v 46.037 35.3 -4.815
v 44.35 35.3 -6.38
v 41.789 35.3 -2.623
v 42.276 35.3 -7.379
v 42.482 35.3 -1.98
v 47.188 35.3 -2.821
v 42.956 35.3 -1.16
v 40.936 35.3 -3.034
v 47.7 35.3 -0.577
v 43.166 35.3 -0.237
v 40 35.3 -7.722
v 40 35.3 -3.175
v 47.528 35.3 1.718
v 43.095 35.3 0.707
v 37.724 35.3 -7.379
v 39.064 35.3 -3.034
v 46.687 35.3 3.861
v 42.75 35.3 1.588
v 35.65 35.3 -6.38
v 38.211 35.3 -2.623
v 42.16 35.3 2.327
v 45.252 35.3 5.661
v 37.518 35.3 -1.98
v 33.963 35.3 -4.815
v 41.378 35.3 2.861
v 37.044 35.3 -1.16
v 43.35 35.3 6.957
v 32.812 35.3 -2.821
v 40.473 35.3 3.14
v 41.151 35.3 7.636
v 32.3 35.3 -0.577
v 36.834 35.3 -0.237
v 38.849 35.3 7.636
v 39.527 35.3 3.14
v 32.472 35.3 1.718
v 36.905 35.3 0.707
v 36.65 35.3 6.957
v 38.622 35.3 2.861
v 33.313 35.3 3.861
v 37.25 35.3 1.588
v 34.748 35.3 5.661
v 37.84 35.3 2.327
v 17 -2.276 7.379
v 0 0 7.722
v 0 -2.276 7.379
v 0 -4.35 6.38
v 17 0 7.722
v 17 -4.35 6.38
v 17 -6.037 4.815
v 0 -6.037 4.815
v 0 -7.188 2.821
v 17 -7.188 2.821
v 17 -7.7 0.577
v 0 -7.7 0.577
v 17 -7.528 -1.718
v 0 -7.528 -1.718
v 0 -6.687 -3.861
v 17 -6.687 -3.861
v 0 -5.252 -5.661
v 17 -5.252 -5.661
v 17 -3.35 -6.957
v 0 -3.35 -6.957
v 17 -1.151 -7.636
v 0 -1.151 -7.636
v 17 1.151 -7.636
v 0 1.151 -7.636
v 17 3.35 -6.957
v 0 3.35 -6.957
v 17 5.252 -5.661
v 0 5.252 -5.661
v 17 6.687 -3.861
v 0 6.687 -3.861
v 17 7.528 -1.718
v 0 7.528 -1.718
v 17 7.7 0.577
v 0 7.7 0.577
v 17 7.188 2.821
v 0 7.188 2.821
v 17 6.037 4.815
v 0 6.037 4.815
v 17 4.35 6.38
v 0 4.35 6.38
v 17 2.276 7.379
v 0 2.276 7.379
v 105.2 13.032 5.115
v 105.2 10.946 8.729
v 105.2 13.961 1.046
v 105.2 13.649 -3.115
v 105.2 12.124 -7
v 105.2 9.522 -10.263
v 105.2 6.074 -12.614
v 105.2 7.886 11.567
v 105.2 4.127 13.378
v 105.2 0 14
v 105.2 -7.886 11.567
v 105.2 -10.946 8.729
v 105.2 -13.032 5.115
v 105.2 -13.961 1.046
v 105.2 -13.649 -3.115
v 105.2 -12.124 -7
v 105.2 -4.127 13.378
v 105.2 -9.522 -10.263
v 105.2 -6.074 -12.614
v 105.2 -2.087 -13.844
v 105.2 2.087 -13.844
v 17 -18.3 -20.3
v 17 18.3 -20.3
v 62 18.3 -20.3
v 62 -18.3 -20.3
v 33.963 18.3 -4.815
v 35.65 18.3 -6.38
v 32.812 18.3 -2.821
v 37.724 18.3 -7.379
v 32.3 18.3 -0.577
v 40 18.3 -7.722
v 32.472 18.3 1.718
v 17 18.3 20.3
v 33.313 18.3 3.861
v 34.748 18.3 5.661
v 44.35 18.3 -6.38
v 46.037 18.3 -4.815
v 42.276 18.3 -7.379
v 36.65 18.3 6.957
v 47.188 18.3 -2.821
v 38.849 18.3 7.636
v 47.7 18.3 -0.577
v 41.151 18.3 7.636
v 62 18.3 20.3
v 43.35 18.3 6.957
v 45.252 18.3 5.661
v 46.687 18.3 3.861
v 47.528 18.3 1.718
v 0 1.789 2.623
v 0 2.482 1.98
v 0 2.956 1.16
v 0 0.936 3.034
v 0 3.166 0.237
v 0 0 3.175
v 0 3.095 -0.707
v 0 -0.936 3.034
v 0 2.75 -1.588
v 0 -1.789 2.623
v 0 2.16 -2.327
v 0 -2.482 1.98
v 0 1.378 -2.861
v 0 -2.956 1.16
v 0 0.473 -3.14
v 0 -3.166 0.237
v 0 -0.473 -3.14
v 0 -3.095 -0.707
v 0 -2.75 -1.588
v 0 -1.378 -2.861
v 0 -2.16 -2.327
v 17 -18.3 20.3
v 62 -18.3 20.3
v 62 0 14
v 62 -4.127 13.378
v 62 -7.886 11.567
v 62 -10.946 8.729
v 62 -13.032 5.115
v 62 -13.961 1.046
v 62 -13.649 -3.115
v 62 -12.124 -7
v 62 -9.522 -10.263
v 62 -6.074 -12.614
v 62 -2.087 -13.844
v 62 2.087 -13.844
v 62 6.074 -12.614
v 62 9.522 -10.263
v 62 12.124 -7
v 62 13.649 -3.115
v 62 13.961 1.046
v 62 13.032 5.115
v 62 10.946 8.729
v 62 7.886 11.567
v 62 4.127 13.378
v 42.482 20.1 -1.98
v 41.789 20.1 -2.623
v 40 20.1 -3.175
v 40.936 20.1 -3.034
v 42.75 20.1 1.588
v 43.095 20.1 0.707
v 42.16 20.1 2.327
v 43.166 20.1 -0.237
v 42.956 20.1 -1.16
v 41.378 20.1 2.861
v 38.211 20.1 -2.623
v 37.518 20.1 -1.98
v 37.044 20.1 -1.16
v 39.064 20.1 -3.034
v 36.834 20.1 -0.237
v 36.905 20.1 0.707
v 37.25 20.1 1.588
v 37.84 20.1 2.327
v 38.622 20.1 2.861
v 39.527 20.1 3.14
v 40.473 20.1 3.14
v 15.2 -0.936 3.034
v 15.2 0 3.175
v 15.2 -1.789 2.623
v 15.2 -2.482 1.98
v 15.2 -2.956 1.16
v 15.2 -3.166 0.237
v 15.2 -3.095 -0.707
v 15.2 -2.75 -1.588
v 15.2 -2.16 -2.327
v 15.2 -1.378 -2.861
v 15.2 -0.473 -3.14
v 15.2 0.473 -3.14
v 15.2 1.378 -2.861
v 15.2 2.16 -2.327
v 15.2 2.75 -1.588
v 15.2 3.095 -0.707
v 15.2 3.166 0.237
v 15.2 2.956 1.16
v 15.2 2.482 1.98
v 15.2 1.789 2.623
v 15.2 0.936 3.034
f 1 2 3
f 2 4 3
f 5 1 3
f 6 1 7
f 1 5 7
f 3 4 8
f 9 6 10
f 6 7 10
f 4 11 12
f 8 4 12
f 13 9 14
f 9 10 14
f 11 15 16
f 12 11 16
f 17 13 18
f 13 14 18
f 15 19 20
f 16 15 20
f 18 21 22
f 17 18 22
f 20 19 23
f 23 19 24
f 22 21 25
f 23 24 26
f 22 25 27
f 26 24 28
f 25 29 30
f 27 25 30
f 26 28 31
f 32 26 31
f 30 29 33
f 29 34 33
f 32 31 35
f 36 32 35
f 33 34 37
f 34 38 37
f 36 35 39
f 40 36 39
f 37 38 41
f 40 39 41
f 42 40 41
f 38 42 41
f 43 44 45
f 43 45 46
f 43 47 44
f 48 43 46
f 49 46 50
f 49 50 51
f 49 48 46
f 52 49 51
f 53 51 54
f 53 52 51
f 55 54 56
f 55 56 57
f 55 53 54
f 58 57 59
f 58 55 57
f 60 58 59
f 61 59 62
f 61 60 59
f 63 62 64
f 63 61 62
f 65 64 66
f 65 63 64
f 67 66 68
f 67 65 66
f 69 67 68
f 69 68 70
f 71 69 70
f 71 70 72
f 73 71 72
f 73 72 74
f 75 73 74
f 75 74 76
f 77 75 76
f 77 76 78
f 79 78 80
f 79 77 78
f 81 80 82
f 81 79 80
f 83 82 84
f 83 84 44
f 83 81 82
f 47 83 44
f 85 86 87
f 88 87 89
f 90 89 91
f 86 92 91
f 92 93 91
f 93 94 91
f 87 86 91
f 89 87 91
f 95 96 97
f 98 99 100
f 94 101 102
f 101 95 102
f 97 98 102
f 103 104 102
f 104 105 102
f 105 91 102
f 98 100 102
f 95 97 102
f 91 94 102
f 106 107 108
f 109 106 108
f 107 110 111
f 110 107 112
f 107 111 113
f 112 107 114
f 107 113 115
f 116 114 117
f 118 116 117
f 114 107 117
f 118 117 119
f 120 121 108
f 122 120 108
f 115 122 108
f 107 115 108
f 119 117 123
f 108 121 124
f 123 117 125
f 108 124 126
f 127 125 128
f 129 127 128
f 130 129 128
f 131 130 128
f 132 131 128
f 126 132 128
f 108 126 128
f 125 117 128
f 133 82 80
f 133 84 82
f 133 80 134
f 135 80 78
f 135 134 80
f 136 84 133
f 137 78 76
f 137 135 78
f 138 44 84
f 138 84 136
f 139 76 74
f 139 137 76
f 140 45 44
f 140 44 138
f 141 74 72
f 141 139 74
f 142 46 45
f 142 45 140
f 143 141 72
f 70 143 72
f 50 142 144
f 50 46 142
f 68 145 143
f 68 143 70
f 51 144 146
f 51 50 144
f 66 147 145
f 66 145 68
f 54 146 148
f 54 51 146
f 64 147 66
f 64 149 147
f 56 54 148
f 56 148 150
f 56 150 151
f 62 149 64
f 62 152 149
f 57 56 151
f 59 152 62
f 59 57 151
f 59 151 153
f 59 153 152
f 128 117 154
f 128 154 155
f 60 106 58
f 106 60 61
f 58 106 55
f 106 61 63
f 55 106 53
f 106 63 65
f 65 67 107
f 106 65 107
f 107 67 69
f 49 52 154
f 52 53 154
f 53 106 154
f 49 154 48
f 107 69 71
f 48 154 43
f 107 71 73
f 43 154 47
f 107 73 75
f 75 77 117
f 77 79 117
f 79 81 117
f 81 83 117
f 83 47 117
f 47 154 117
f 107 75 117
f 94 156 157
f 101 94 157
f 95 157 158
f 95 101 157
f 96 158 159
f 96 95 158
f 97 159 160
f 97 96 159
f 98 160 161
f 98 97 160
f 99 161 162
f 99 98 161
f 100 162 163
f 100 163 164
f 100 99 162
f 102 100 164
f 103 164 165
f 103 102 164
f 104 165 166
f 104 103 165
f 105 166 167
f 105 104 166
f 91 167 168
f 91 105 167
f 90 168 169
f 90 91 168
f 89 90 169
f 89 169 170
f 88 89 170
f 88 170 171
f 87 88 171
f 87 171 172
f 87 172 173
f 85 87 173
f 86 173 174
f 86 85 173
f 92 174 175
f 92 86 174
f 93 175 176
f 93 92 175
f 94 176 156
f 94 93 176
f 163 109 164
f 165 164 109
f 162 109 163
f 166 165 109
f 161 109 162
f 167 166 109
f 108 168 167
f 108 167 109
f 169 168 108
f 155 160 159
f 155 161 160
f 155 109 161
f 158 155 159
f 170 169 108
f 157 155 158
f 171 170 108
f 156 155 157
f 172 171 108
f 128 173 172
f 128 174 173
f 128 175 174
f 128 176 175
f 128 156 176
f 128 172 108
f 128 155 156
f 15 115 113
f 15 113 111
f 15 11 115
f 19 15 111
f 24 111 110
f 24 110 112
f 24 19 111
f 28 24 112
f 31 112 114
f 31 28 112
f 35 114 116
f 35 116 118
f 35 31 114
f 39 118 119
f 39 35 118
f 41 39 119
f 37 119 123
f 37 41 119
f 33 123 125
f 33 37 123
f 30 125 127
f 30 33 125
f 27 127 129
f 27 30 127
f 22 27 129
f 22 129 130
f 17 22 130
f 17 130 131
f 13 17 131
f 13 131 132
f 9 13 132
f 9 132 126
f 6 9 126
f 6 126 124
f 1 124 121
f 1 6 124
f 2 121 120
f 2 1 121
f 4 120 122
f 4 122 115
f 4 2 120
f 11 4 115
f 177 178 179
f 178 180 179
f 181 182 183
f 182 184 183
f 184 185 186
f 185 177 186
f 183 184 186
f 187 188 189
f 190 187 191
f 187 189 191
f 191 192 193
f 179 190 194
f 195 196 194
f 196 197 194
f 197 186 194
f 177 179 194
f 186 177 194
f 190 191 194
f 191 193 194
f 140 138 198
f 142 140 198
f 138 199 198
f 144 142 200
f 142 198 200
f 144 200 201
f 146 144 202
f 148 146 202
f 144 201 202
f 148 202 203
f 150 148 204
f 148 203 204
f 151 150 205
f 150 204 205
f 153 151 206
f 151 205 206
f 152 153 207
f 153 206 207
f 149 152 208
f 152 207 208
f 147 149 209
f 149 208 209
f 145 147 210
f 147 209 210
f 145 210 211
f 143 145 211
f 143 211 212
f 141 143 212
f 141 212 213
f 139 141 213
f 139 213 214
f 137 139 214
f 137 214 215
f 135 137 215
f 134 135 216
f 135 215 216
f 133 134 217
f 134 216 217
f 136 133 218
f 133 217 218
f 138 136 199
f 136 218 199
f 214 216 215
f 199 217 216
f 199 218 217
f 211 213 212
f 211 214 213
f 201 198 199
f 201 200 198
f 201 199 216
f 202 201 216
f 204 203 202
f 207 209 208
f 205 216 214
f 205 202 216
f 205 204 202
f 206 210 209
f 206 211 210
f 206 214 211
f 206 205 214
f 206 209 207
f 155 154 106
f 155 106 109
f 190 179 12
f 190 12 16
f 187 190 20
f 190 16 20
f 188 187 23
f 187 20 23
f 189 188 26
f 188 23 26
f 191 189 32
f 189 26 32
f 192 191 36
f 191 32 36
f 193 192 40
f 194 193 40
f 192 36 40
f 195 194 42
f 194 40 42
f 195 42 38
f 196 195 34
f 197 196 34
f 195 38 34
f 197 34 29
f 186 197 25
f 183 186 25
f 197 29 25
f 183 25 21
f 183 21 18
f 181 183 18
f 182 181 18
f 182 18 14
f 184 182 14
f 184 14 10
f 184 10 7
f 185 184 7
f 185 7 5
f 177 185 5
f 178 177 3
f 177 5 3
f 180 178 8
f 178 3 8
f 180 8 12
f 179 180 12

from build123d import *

# Parameters (mm, degrees)
BODY_SKETCH_W          = 45
BODY_SKETCH_H          = 36.6
BODY_DEPTH             = 20.3
INLET_SKETCH_W         = 17
INLET_SKETCH_H         = 7.722
SPRING_CAP_SKETCH_W    = 43.2
SPRING_CAP_SKETCH_H    = 14
OUTLET_SKETCH_W        = 7.722
OUTLET_SKETCH_H        = 17
INLET_SOCKET_SKETCH_W  = 16.2
INLET_SOCKET_SKETCH_H  = 3.175
OUTLET_SOCKET_SKETCH_W = 3.175
OUTLET_SOCKET_SKETCH_H = 16.2


with BuildPart() as part:
    # Body Sketch → Body (new, symmetric)
    with BuildSketch(Plane.XY):
        with Locations((39.5, 0)):
            Rectangle(BODY_SKETCH_W, BODY_SKETCH_H)
    extrude(amount=BODY_DEPTH, both=True)

    # Inlet Sketch → Inlet (revolve)
    with BuildSketch(Plane.XY):
        with Locations((8.5, 3.861)):
            Rectangle(INLET_SKETCH_W, INLET_SKETCH_H)
    revolve(axis=Axis((-1000, 0, 0), (1, 0, 0)))

    # Spring Cap Sketch → Spring Cap (revolve)
    with BuildSketch(Plane.XY):
        with Locations((83.6, 7)):
            Rectangle(SPRING_CAP_SKETCH_W, SPRING_CAP_SKETCH_H)
    revolve(axis=Axis((-1000, 0, 0), (1, 0, 0)))

    # Outlet Sketch → Outlet (revolve)
    with BuildSketch(Plane.XY):
        with Locations((43.861, 26.8)):
            Rectangle(OUTLET_SKETCH_W, OUTLET_SKETCH_H)
    revolve(axis=Axis((40, 0, 0), (0, 1, 0)))

    # Inlet Socket Sketch → Inlet Socket (revolve, cut)
    with BuildSketch(Plane.XY):
        with Locations((7.1, 1.5875)):
            Rectangle(INLET_SOCKET_SKETCH_W, INLET_SOCKET_SKETCH_H)
    revolve(axis=Axis((-1000, 0, 0), (1, 0, 0)), mode=Mode.SUBTRACT)

    # Outlet Socket Sketch → Outlet Socket (revolve, cut)
    with BuildSketch(Plane.XY):
        with Locations((41.5875, 28.2)):
            Rectangle(OUTLET_SOCKET_SKETCH_W, OUTLET_SOCKET_SKETCH_H)
    revolve(axis=Axis((40, 0, 0), (0, 1, 0)), mode=Mode.SUBTRACT)


solid = part.part
